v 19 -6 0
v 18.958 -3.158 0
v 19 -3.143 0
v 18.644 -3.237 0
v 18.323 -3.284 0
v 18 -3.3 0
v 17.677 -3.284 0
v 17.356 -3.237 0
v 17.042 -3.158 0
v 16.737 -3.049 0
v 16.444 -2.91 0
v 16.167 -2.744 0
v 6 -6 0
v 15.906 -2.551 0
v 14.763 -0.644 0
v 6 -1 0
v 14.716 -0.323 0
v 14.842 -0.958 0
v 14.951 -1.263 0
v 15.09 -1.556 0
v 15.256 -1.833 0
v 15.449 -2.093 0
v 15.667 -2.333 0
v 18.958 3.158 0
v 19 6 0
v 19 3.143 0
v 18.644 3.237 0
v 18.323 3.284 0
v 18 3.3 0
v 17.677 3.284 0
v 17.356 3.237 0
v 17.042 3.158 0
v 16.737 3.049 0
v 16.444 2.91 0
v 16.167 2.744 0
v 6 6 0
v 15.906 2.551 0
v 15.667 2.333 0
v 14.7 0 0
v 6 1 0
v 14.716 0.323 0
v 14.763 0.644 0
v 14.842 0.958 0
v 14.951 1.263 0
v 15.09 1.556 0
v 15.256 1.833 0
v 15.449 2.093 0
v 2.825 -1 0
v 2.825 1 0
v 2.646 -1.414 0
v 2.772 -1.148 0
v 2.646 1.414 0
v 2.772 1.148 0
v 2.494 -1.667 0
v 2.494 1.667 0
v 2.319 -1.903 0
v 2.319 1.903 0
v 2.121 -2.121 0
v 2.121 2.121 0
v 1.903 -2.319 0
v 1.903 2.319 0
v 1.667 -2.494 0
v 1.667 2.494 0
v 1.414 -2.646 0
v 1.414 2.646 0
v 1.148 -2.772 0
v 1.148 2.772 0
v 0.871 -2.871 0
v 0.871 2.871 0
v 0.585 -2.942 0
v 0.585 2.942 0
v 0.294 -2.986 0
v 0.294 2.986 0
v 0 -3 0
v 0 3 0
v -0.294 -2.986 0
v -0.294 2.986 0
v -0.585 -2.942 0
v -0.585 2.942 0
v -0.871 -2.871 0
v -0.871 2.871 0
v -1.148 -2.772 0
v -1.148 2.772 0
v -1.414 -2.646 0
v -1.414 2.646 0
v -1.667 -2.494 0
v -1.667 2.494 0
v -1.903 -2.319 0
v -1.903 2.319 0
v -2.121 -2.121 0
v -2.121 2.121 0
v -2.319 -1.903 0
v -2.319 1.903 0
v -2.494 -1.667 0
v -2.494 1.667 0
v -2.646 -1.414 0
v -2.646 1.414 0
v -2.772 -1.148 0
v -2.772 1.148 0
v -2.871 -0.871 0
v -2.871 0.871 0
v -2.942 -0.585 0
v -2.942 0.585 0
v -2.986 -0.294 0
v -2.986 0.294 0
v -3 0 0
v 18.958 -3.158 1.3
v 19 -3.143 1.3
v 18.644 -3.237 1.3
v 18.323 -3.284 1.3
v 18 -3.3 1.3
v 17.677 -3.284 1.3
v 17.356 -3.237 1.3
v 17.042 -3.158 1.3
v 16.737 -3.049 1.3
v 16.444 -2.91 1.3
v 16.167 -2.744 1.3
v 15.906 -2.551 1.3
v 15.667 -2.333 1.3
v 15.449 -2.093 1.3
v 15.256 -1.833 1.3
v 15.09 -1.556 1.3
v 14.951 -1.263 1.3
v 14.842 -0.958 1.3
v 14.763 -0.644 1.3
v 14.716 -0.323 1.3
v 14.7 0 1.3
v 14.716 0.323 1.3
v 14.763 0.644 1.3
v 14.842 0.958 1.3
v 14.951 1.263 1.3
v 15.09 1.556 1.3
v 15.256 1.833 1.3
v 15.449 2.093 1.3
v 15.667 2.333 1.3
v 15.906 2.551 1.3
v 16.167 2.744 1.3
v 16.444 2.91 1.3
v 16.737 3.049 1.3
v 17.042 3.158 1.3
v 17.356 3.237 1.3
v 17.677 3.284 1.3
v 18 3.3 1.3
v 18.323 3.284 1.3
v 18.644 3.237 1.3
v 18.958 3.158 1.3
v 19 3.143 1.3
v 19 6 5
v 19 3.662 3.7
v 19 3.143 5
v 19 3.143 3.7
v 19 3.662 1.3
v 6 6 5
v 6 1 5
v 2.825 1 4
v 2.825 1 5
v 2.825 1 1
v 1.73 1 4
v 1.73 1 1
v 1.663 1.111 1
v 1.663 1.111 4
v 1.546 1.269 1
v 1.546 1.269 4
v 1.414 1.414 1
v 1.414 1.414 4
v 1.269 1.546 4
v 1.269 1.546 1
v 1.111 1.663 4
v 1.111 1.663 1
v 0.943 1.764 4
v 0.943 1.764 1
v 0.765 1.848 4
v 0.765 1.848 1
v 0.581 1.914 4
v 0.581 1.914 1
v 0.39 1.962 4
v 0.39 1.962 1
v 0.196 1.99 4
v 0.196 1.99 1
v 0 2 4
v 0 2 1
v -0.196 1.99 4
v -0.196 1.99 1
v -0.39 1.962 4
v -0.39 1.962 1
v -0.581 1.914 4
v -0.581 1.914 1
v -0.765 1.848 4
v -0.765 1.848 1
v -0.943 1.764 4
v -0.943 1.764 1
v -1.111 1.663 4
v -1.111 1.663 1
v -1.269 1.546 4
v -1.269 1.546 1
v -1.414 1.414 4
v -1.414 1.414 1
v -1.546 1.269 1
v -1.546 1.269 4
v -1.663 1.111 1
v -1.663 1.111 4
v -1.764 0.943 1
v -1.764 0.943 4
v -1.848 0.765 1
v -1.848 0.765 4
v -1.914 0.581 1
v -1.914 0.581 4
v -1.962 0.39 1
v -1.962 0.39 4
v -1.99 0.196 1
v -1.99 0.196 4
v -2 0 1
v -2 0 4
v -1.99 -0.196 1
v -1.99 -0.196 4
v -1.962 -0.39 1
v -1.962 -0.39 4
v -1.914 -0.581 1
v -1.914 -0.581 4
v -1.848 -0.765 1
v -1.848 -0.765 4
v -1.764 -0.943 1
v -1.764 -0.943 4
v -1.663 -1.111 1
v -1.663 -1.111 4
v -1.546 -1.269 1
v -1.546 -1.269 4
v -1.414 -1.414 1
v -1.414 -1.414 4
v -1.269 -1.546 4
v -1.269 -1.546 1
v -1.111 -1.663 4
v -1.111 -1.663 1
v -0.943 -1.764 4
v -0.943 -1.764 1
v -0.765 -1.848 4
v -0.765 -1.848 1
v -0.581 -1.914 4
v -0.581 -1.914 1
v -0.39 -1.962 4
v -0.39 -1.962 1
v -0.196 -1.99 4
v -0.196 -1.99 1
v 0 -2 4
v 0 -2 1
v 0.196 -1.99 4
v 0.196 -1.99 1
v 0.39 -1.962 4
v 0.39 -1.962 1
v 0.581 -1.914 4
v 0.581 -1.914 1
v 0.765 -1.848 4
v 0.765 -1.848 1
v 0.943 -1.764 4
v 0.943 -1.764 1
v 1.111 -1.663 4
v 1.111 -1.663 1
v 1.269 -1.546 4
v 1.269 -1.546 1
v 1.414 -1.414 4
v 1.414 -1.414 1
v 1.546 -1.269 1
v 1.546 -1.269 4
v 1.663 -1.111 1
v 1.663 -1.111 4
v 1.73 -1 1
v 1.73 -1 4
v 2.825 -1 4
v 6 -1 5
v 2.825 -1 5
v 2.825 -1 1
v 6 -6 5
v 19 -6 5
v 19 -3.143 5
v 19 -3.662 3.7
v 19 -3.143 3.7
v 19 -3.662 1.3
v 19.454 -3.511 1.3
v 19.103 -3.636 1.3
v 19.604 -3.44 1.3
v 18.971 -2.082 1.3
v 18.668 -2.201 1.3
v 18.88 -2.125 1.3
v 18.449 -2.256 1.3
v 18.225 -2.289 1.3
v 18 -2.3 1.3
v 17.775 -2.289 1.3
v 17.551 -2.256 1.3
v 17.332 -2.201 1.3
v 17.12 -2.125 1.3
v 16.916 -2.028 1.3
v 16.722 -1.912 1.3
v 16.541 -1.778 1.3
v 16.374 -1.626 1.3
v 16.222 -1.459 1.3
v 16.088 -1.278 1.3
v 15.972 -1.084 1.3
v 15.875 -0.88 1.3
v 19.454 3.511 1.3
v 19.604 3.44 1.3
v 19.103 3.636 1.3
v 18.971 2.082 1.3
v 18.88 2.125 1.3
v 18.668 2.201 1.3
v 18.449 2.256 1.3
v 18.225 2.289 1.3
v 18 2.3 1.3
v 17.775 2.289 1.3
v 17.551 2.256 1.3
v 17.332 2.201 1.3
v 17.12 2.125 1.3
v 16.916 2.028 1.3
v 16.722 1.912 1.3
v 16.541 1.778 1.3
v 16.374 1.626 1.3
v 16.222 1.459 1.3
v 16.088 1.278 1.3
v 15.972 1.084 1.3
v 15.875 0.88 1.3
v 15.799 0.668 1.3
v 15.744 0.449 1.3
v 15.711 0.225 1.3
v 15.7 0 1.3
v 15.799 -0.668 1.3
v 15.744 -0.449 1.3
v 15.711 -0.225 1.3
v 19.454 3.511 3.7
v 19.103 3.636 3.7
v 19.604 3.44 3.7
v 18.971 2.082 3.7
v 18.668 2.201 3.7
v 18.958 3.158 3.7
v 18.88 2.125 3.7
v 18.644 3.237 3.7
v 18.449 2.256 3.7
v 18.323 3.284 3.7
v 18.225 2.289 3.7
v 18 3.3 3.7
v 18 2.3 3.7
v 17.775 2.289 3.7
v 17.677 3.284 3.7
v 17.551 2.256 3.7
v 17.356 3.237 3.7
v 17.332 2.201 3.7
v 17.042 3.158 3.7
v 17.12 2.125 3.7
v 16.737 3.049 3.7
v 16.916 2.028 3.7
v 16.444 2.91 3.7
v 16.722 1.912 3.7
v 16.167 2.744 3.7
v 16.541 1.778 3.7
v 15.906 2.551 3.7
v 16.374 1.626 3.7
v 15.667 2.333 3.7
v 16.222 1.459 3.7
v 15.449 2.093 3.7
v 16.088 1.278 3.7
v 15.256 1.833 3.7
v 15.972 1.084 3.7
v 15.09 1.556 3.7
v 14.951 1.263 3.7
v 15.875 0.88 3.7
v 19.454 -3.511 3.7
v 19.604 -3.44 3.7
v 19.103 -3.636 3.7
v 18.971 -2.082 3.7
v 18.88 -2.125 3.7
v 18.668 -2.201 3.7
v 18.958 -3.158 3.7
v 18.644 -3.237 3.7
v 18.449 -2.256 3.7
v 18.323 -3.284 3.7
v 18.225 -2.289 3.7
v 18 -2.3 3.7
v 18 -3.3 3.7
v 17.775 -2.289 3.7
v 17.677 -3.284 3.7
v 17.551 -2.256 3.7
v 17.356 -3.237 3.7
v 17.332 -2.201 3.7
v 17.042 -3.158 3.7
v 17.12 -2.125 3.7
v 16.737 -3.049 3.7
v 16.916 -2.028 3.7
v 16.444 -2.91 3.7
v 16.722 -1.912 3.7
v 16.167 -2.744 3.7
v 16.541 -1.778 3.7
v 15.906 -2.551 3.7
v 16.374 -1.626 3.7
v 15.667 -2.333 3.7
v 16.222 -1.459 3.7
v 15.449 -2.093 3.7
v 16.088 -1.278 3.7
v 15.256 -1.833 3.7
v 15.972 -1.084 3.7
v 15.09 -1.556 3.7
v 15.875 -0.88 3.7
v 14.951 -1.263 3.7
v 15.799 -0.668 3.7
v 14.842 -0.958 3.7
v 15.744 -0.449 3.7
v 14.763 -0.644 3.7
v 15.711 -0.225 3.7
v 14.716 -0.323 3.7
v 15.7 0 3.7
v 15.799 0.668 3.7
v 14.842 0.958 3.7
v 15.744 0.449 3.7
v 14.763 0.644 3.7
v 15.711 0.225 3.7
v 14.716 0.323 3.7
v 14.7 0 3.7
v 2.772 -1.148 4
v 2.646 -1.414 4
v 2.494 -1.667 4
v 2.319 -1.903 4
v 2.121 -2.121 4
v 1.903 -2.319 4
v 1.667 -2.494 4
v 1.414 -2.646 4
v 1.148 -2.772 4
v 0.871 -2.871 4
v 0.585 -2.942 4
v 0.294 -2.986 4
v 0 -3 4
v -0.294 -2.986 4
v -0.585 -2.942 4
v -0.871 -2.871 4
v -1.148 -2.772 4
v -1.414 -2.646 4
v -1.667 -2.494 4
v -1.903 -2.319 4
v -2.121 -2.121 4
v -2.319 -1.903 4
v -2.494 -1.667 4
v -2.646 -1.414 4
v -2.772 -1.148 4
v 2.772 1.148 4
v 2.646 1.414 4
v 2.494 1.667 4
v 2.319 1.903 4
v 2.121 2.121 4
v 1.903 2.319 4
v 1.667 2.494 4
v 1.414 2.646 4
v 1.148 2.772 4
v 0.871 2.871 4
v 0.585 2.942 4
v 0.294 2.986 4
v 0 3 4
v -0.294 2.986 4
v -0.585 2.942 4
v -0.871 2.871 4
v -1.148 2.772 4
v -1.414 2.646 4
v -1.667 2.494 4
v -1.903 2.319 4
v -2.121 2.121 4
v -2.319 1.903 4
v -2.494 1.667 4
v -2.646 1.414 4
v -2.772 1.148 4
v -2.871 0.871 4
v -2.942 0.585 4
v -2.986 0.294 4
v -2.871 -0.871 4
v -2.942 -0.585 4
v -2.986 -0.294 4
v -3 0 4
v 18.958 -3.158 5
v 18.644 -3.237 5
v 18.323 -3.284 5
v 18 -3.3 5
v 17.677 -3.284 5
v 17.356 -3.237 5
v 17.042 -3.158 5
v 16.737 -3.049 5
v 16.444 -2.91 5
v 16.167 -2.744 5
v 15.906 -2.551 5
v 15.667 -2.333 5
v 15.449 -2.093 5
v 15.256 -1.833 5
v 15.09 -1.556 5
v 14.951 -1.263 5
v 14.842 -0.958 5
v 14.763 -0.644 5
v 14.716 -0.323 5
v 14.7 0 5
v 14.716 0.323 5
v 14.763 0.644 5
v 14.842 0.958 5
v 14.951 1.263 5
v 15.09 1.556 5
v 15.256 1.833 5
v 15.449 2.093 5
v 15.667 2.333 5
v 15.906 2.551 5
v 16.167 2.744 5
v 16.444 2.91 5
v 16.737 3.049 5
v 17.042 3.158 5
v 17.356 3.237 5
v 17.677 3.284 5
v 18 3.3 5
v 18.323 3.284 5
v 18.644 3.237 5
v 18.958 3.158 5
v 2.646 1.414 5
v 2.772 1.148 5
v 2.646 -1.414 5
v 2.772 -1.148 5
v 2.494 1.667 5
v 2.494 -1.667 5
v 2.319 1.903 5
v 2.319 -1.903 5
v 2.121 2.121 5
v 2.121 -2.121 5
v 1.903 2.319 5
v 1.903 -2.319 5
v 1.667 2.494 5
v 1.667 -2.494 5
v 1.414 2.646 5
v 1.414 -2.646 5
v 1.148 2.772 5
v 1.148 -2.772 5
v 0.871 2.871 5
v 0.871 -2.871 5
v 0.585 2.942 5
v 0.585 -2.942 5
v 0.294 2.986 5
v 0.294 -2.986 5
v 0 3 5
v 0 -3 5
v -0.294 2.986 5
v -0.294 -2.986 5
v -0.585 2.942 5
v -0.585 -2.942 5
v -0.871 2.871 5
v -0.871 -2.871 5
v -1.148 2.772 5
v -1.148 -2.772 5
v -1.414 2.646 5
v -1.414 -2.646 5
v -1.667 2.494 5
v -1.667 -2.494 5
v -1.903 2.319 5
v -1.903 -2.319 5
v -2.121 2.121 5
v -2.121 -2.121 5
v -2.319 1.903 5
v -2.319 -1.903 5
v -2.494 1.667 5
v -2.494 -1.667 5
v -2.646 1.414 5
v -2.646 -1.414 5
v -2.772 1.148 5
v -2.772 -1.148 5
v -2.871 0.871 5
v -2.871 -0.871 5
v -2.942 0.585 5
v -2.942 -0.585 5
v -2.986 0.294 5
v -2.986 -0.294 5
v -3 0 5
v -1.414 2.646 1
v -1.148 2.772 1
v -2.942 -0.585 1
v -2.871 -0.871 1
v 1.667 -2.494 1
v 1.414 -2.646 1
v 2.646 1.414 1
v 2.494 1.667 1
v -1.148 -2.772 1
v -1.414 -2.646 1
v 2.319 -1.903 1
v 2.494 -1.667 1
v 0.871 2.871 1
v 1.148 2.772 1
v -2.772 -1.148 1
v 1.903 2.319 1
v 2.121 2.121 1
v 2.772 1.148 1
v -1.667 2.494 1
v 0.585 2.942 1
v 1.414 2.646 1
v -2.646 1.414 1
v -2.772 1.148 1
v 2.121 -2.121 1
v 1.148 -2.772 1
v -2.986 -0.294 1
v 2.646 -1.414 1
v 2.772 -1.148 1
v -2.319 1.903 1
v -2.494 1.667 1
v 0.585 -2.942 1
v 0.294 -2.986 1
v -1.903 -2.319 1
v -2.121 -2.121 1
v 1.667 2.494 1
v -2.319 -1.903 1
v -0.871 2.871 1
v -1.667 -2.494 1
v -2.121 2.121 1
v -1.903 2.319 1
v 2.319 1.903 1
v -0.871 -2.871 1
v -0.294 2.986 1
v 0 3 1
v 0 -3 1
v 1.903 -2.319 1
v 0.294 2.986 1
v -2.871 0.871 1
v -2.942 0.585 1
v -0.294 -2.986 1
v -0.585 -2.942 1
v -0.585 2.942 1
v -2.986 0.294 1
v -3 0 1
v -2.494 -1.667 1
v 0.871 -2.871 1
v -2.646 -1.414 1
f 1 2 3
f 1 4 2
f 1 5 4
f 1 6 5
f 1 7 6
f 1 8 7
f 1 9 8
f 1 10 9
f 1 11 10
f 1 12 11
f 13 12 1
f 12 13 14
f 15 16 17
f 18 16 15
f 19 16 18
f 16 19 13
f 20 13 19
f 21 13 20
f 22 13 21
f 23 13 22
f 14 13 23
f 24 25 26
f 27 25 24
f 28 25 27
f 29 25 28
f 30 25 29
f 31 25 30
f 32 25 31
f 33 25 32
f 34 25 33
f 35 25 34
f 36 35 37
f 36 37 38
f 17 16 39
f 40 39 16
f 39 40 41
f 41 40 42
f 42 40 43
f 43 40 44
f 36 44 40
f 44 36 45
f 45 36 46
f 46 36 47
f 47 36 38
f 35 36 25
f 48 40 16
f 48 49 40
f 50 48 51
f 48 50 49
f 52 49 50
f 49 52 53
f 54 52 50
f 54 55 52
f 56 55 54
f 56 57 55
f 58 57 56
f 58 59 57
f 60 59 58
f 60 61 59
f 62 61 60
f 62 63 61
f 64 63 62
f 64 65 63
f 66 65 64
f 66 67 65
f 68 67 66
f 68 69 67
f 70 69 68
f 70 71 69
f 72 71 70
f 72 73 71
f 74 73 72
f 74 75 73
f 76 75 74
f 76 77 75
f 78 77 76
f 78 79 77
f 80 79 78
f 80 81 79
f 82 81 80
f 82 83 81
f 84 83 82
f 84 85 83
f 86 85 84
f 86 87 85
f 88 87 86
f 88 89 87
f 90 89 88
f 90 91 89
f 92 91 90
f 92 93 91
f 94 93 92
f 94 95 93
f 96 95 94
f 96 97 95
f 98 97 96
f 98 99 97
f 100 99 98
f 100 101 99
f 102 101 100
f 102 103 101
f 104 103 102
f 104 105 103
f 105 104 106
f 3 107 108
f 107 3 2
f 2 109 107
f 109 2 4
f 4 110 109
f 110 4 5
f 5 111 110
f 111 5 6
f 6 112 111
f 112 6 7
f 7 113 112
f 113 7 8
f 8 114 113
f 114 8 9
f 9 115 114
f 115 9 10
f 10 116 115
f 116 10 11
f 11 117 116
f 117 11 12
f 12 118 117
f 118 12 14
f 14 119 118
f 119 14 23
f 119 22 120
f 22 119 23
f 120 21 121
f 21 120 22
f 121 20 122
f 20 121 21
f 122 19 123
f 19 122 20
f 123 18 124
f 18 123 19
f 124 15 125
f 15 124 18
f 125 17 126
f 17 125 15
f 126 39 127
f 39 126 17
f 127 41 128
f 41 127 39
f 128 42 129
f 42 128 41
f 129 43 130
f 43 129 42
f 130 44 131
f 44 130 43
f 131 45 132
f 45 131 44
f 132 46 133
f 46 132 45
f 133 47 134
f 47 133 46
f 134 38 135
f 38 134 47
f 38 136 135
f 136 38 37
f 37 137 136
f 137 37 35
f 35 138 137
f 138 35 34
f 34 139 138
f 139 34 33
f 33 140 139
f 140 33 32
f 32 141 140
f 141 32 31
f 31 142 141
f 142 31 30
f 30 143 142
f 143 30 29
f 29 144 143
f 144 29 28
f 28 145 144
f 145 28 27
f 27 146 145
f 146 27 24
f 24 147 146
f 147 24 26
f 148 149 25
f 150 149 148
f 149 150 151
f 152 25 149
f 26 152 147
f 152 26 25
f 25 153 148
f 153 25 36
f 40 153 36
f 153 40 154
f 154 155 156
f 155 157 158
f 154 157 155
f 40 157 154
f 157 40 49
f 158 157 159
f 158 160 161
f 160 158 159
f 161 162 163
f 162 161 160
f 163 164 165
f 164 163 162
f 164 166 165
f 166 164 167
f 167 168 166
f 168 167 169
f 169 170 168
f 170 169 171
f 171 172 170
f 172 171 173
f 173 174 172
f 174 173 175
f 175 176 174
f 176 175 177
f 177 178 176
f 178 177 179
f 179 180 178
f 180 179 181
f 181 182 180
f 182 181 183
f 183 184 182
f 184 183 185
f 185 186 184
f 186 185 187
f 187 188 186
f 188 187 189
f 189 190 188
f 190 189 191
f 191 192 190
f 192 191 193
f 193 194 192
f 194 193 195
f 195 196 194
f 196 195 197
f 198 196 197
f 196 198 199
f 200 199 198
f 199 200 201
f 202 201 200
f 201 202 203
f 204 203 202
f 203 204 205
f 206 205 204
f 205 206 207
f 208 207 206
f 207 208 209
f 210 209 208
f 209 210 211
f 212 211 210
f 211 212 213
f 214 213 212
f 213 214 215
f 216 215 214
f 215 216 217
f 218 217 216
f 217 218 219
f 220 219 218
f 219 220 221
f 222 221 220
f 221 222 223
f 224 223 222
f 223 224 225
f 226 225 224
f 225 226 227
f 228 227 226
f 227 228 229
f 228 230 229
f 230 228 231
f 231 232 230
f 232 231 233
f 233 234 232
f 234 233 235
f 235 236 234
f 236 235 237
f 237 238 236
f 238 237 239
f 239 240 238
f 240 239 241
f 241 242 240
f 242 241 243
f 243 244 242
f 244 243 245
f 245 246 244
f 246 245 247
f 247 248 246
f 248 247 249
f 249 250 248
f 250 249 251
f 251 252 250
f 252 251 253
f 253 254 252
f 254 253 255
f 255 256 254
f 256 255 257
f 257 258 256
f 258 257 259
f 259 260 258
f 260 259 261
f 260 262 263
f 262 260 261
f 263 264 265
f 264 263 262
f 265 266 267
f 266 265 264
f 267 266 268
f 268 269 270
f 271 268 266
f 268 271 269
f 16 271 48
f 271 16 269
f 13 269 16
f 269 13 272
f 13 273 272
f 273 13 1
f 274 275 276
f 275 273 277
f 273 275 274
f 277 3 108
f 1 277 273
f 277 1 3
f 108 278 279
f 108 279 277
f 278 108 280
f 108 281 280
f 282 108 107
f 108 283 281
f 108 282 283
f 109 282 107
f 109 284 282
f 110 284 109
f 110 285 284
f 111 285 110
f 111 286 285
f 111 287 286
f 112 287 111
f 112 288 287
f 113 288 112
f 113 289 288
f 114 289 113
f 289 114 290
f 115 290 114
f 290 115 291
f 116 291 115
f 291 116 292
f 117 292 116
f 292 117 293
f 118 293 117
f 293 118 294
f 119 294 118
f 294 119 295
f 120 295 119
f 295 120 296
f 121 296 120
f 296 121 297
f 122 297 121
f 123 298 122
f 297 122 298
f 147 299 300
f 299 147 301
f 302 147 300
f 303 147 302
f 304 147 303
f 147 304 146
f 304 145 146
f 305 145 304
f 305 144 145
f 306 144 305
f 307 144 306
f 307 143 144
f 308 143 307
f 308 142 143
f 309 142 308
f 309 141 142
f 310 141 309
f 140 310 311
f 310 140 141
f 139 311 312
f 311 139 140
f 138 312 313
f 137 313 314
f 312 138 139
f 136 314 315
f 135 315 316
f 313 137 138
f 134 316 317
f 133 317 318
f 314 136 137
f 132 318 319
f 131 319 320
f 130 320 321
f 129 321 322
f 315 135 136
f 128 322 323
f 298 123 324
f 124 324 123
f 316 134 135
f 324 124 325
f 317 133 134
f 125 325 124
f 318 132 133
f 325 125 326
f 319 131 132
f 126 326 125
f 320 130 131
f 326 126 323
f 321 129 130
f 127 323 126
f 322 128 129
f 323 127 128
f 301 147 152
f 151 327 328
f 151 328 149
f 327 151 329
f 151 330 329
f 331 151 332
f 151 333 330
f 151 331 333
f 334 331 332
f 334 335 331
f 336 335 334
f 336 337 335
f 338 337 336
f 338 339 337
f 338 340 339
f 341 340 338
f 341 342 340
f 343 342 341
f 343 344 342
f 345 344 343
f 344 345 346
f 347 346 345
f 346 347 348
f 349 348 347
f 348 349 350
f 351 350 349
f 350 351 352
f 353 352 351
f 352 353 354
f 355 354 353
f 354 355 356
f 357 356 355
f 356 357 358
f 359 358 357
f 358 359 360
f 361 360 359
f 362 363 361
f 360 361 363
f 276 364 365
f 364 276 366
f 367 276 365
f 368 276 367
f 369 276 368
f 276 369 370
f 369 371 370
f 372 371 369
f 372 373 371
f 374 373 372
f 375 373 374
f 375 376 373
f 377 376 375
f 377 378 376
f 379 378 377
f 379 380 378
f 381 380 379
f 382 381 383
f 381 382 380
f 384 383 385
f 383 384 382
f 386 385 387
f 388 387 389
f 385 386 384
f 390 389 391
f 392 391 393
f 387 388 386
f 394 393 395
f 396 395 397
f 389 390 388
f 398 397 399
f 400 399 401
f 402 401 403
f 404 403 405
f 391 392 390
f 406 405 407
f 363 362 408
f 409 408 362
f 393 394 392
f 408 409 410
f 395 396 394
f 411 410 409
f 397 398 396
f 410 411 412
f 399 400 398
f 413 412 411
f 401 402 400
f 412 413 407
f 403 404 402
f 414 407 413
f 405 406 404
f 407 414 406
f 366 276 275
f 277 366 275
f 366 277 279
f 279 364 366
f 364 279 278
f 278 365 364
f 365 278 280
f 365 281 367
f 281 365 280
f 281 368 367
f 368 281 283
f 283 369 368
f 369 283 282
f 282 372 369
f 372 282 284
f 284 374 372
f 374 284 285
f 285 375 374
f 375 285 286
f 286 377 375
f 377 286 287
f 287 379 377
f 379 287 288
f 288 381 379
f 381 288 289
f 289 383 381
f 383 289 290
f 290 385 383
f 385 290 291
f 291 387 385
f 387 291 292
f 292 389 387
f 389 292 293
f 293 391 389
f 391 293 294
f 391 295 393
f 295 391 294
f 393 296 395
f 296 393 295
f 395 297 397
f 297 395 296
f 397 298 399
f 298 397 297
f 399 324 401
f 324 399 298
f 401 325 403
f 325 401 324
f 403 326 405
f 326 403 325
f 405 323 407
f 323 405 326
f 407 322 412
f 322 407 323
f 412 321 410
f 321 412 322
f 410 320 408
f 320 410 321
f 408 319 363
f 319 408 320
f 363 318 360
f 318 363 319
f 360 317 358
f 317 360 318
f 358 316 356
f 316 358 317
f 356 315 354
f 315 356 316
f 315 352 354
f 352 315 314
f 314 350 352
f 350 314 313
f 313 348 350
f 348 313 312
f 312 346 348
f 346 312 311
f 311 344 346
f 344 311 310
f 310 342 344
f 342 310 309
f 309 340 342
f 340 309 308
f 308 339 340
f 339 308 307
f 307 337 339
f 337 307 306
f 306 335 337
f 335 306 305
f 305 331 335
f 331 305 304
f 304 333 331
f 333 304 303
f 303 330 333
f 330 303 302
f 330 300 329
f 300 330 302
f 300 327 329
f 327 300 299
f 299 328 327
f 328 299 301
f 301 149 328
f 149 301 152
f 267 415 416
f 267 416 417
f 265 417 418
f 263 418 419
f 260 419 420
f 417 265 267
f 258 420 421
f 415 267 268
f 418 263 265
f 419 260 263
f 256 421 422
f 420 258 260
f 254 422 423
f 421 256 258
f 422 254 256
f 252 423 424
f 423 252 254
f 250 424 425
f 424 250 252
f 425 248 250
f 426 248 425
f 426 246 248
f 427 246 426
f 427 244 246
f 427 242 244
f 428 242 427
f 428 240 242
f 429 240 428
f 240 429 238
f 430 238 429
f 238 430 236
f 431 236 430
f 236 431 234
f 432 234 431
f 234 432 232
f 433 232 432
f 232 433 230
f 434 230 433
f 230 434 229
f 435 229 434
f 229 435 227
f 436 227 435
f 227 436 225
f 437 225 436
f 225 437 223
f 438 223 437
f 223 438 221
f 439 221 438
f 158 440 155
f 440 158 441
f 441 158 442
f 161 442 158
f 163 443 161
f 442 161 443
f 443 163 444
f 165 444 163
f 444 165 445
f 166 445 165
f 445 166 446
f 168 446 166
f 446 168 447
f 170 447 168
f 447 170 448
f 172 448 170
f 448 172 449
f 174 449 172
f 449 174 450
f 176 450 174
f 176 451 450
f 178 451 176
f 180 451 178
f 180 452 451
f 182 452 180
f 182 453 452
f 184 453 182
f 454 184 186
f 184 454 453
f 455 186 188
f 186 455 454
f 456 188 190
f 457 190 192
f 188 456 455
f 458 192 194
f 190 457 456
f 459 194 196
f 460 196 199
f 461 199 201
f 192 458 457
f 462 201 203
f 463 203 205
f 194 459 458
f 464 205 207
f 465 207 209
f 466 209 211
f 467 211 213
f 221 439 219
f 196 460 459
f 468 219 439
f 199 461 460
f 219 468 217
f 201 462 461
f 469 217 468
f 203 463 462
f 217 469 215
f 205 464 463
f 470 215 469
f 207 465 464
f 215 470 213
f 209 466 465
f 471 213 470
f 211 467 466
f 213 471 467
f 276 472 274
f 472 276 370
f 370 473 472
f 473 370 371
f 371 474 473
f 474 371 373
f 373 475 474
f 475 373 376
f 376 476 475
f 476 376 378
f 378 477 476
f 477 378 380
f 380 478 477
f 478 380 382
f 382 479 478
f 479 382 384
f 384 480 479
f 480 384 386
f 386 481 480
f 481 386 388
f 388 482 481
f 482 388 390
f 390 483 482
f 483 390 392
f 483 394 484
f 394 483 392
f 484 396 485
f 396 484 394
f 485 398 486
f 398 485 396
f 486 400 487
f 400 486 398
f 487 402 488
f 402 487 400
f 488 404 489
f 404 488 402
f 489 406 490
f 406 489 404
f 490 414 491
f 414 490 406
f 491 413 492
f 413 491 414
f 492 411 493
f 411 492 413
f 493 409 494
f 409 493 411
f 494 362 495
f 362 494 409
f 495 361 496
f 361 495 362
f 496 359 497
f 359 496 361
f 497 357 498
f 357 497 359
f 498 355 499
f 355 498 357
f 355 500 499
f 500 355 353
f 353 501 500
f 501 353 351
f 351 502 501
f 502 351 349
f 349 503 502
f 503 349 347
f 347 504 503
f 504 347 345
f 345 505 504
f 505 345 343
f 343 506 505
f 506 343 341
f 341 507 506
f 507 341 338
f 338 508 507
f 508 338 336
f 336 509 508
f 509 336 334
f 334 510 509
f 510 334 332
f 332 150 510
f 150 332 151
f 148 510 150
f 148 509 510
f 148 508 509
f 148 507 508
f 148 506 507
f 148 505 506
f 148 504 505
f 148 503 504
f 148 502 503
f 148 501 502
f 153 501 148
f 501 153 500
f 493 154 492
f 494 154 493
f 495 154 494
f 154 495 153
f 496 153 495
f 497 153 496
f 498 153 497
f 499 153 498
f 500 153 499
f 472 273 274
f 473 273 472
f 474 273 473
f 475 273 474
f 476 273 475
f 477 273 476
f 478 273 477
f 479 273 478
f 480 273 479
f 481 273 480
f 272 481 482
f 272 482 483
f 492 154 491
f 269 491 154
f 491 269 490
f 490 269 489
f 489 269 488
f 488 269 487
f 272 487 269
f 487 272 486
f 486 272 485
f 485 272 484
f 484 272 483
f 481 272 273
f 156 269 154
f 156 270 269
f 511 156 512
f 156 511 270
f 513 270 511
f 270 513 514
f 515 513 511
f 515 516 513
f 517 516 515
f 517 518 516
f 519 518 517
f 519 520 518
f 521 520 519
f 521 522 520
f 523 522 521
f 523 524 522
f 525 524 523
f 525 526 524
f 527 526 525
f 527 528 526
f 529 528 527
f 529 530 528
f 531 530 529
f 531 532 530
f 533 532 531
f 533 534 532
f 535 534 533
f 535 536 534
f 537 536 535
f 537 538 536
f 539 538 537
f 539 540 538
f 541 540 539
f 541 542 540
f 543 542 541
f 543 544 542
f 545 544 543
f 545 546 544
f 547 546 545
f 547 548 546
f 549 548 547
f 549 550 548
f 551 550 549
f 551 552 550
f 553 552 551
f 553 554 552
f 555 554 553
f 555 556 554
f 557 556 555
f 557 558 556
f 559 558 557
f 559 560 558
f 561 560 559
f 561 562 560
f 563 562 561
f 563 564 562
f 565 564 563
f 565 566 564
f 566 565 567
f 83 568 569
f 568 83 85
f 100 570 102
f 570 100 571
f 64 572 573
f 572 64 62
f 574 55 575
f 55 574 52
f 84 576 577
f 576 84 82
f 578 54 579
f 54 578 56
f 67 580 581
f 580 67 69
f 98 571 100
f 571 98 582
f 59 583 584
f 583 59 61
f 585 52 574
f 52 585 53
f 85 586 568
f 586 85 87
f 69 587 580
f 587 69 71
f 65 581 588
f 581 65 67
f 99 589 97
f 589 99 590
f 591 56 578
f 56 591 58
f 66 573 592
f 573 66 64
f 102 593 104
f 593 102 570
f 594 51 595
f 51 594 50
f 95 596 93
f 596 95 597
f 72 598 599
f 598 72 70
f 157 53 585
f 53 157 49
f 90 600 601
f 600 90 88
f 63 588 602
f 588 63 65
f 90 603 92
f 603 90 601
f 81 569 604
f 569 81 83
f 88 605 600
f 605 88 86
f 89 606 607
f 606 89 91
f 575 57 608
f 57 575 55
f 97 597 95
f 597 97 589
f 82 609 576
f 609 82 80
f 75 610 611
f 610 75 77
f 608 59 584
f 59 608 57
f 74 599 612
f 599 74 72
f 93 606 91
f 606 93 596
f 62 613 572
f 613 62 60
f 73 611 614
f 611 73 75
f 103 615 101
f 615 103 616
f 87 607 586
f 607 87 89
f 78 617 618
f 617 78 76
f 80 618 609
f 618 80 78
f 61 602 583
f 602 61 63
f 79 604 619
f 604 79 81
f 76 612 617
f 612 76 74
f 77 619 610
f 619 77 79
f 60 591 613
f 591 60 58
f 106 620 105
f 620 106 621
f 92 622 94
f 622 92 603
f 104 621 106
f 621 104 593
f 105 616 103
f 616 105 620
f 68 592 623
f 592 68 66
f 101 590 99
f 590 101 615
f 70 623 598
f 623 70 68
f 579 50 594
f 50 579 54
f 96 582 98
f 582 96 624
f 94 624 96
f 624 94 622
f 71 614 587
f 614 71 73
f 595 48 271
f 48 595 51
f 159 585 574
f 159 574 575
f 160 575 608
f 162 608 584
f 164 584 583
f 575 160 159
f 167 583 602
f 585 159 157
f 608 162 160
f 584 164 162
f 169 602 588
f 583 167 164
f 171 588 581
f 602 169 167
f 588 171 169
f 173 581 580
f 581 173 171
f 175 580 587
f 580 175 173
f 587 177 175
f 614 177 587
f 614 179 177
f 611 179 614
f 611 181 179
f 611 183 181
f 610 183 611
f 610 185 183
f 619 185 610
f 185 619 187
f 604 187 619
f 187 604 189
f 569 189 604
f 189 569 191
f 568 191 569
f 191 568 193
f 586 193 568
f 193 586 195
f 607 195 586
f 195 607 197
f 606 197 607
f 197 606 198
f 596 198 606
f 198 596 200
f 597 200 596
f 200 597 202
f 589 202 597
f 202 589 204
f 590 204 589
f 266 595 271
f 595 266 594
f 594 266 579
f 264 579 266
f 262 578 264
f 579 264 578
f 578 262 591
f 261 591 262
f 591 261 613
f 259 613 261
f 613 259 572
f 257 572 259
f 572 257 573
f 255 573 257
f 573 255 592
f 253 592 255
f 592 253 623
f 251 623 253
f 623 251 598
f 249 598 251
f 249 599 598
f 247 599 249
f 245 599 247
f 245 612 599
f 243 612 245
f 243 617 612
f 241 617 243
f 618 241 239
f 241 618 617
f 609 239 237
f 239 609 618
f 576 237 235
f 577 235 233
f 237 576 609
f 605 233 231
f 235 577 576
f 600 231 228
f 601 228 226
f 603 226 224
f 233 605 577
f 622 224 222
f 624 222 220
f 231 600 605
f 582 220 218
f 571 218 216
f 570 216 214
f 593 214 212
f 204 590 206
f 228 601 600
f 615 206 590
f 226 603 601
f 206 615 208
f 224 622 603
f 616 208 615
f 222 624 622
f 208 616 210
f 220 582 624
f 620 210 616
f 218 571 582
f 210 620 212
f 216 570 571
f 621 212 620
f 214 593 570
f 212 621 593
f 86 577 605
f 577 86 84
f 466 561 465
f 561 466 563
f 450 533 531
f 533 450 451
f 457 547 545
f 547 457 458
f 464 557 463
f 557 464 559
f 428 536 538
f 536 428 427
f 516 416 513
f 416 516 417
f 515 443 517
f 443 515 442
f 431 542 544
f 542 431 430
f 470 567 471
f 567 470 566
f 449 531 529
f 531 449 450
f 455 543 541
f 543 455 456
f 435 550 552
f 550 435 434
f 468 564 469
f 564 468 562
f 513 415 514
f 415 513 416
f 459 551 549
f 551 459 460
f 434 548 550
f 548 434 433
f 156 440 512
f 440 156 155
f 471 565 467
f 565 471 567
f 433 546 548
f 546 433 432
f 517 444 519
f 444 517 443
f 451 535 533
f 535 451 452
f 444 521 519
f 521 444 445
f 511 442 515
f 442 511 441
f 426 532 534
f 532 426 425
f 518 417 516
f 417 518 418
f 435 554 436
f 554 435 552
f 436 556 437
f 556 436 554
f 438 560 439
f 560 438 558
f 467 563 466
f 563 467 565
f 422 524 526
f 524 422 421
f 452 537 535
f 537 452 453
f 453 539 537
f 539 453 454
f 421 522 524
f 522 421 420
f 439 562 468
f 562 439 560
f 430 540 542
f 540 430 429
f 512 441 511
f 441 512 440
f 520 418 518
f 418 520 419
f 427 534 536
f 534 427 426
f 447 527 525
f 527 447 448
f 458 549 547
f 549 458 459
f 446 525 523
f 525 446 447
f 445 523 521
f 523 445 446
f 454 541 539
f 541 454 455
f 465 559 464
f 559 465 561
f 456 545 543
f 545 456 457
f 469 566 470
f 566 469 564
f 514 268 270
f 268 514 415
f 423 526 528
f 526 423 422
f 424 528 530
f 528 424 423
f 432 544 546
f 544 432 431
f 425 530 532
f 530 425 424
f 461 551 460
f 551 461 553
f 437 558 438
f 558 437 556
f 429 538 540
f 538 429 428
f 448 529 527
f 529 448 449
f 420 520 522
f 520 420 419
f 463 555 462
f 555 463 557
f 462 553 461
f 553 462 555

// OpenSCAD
part = "link"; // [link, assembly]
cadverify_only = "";
module instance(name, part, unit = 1) {
    echo(cadverify_instance = [name, part, unit]);
    if (cadverify_only == "" || cadverify_only == name) children();
}

// Parameters (mm)
pitch = 18;          // pin-to-bore distance (10 links = 180mm)
link_w = 12;         // width (Y)
link_t = 5;          // thickness (Z)
pin_d = 4;           // pin shaft diameter
bore_d = 4.6;        // bore diameter (0.3 radial clearance)
cap_d = 6;           // cap diameter
cap_h = 1;           // cap thickness
gap_z = 0.3;         // vertical clearance cap<->knuckle
kn_out_d = 7.6;      // knuckle outer diameter (1.5 wall)
cap_cav_d = 6.6;     // cap cavity diameter (0.3 radial clearance)
neck_w = 2;          // neck width
slot_half = 65;      // slot half-angle (deg), allows +-30 deg swing
yoke_west = 6;       // yoke west edge (local X)
yoke_east = 19;      // yoke east extent (local X, 1.0 past bore)
$fn = 64;

module link_geom() {
    bore_x = pitch;
    pin_r = pin_d/2;
    bore_r = bore_d/2;
    kn_out_r = kn_out_d/2;
    cav_r = cap_cav_d/2;
    cap_r = cap_d/2;
    wedge_far = 30;
    dy_far = wedge_far * tan(slot_half);
    bot_h = cap_h;            // 0..1
    gap_h = gap_z;            // 0.3
    kn_h = link_t - 2*cap_h - 2*gap_h; // 2.4 (1.3..3.7)
    // bottom (0..1): pin+neck+yoke minus cap cavity minus slot
    translate([0,0,0]) linear_extrude(height = bot_h, convexity = 8) {
        difference() {
            union() {
                circle(r = pin_r);
                translate([0,-neck_w/2]) square([yoke_west+1, neck_w]);
                translate([yoke_west,-link_w/2]) square([yoke_east-yoke_west, link_w]);
            }
            translate([bore_x,0]) circle(r = cav_r);
            polygon(points = [[bore_x,0],[bore_x+wedge_far, dy_far],[bore_x+wedge_far, -dy_far]]);
        }
    }
    // lower gap (1..1.3): same footprint
    translate([0,0,bot_h]) linear_extrude(height = gap_h, convexity = 8) {
        difference() {
            union() {
                circle(r = pin_r);
                translate([0,-neck_w/2]) square([yoke_west+1, neck_w]);
                translate([yoke_west,-link_w/2]) square([yoke_east-yoke_west, link_w]);
            }
            translate([bore_x,0]) circle(r = cav_r);
            polygon(points = [[bore_x,0],[bore_x+wedge_far, dy_far],[bore_x+wedge_far, -dy_far]]);
        }
    }
    // middle knuckle zone (1.3..3.7)
    translate([0,0,bot_h+gap_h]) linear_extrude(height = kn_h, convexity = 8) {
        difference() {
            union() {
                circle(r = pin_r);
                translate([0,-neck_w/2]) square([yoke_west+1, neck_w]);
                translate([yoke_west,-link_w/2]) square([yoke_east-yoke_west, link_w]);
                translate([bore_x,0]) circle(r = kn_out_r);
            }
            translate([bore_x,0]) circle(r = bore_r);
            polygon(points = [[bore_x,0],[bore_x+wedge_far, dy_far],[bore_x+wedge_far, -dy_far]]);
        }
    }
    // upper gap (3.7..4)
    translate([0,0,bot_h+gap_h+kn_h]) linear_extrude(height = gap_h, convexity = 8) {
        difference() {
            union() {
                circle(r = pin_r);
                translate([0,-neck_w/2]) square([yoke_west+1, neck_w]);
                translate([yoke_west,-link_w/2]) square([yoke_east-yoke_west, link_w]);
            }
            translate([bore_x,0]) circle(r = cav_r);
            polygon(points = [[bore_x,0],[bore_x+wedge_far, dy_far],[bore_x+wedge_far, -dy_far]]);
        }
    }
    // top (4..5)
    translate([0,0,bot_h+gap_h+kn_h+gap_h]) linear_extrude(height = bot_h, convexity = 8) {
        difference() {
            union() {
                circle(r = pin_r);
                translate([0,-neck_w/2]) square([yoke_west+1, neck_w]);
                translate([yoke_west,-link_w/2]) square([yoke_east-yoke_west, link_w]);
            }
            translate([bore_x,0]) circle(r = cav_r);
            polygon(points = [[bore_x,0],[bore_x+wedge_far, dy_far],[bore_x+wedge_far, -dy_far]]);
        }
    }
    // caps (pin ends)
    translate([0,0,0]) cylinder(h = cap_h, r = cap_r);
    translate([0,0,link_t-cap_h]) cylinder(h = cap_h, r = cap_r);
}

if (part == "assembly") {
    instance("link1", "link", 1) translate([0,0,0]) link_geom();
    instance("link2", "link", 1) translate([18,0,0]) link_geom();
    instance("link3", "link", 1) translate([36,0,0]) link_geom();
    echo(cadverify_spec = [
        ["bounds", [[-3, -6, 0], [55.7, 6, 5]]],
        ["support_faces", [["bed", "-z", 200]]],
        ["motions", [
            ["bend", ["link3"], "rotate", [36, 0, 0], [0, 0, 1], [-30, 30]]
        ]],
        ["assembly_order", [
            [["link1", "link2", "link3"], [0, 0, 0]]
        ]],
        ["print_in_place", 0.3],
        ["overhangs_allowed", [
            ["pin cap link1", [[-3, -3, 3.8], [3, 3, 4.2]]],
            ["knuckle joint1", [[14, -4, 1.0], [22, 4, 1.6]]],
            ["pin cap link2", [[15, -3, 3.8], [21, 3, 4.2]]],
            ["knuckle joint2", [[32, -4, 1.0], [40, 4, 1.6]]],
            ["pin cap link3", [[33, -3, 3.8], [39, 3, 4.2]]],
            ["knuckle end", [[50, -4, 1.0], [58, 4, 1.6]]]
        ]],
        ["held", ["link1", "link2", "link3"]]
    ]);
} else {
    link_geom();
    echo(cadverify_spec = [
        ["bounds", [[-3, -6, 0], [19.7, 6, 5]]],
        ["bodies", 1],
        ["through_holes", 0],
        ["support_faces", [["bed", "-z", 100]]],
        ["overhangs_allowed", [
            ["pin cap", [[-3, -3, 3.8], [3, 3, 4.2]]],
            ["knuckle ceiling", [[14, -4, 1.0], [22, 4, 1.6]]]
        ]],
        ["copies", 3],
        ["details", [
            ["body", "material", [[6, -6, 0], [14, 6, 5]], 0.85],
            ["neck", "material", [[0, -1, 0], [7, 1, 5]], 0.8],
            ["knuckle", "material", [[14.2, -3.8, 1.3], [21.8, 3.8, 3.7]], 0.25],
            ["slot", "void", [[19, -1, 0], [21, 1, 5]], 0.8],
            ["cap_cavity", "void", [[14.7, -3.3, 0], [21.3, 3.3, 1]], 0.5],
            ["wall", "thickness", [18, 7, 2.5], [0, -1, 0], 3.7],
            ["floor", "thickness", [9, 0, -1], [0, 0, 1], 5]
        ]]
    ]);
}
